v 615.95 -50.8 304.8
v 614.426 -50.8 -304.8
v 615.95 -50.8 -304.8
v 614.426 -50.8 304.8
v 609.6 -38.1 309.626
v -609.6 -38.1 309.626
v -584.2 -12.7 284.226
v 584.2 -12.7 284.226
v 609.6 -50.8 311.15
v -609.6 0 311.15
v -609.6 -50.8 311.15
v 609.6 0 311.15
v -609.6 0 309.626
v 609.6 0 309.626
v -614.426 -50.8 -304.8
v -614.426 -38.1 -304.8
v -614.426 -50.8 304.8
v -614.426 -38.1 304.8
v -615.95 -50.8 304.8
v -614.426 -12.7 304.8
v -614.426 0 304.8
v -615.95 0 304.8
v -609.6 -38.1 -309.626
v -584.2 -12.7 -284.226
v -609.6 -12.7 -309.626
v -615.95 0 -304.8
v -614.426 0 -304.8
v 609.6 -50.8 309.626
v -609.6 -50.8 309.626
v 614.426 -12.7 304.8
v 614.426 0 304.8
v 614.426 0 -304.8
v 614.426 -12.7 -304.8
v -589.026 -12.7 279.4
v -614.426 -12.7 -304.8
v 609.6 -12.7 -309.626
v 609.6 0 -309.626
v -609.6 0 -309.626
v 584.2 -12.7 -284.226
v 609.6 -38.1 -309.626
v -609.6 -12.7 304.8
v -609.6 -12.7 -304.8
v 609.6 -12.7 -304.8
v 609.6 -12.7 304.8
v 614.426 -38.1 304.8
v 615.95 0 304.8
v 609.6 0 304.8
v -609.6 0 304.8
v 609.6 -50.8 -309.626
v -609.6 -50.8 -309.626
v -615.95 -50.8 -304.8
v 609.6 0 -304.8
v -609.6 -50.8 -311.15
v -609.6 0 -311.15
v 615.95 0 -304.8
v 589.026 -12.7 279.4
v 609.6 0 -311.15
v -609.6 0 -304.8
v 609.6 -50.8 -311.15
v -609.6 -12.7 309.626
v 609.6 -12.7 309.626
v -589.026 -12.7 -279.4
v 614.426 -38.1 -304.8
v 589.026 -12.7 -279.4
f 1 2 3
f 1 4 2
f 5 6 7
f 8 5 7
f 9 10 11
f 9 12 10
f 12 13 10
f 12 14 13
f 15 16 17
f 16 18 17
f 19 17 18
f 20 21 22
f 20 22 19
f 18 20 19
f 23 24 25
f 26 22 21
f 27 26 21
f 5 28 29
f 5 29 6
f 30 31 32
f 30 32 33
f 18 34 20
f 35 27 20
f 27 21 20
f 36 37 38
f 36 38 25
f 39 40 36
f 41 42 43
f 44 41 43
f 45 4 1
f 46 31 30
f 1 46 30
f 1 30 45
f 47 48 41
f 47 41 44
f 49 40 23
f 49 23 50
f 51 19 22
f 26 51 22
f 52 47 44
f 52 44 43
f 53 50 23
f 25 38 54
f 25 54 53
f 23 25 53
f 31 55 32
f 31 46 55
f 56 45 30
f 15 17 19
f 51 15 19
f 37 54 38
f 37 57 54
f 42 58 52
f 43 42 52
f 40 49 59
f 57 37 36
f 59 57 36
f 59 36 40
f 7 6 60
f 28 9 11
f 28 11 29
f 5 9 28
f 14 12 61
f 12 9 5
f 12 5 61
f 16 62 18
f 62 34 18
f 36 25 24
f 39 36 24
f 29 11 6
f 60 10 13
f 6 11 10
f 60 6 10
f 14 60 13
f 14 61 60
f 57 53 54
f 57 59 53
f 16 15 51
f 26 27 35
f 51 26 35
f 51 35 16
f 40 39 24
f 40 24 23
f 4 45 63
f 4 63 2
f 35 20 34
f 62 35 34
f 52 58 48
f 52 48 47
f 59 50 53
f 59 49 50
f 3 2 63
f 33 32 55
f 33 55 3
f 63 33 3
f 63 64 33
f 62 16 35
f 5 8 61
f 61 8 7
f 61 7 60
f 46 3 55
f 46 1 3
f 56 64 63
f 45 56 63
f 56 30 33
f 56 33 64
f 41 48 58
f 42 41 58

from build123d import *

# Parameters (mm, degrees)
SKETCH1_W             = 1219.2
SKETCH1_H             = 609.6
BOSS_EXTRUDE1_DEPTH   = 12.7
BOSS_EXTRUDE2_DEPTH   = 609.6
BOSS_EXTRUDE2_2_DEPTH = 609.6
BOSS_EXTRUDE3_DEPTH   = 304.8
BOSS_EXTRUDE3_2_DEPTH = 304.8
CUT_EXTRUDE1_START    = -38.1
CUT_EXTRUDE1_DEPTH    = 25.4
CUT_EXTRUDE1_2_DEPTH  = 25.4
CUT_EXTRUDE1_3_DEPTH  = 25.4
CUT_EXTRUDE1_4_DEPTH  = 25.4


# Read off the part's stored shape, not the designer's step: Cut-Extrude1
with BuildPart() as part:
    # Sketch1 → Boss-Extrude1 (new body)
    with BuildSketch(Plane(origin=(0, 0, 0), x_dir=(1, 0, 0), z_dir=(0, 1, 0))):
        Rectangle(SKETCH1_W, SKETCH1_H)
    extrude(amount=-BOSS_EXTRUDE1_DEPTH)


with BuildPart() as body_2:
    # Sketch2 → Boss-Extrude2 (new, symmetric)
    with BuildSketch(Plane(origin=(0, 0, 0), x_dir=(0, 0, -1), z_dir=(1, 0, 0))):
        Polygon((-311.15, 0), (-311.15, -50.8), (-309.626, -50.8), (-309.626, -38.1), (-284.226, -12.7), (-309.626, -12.7), (-309.626, 0), align=None)
    extrude(amount=BOSS_EXTRUDE2_DEPTH, both=True)

    # Cut-Extrude1 4 outline → Cut-Extrude1 4 (cut)
    with BuildSketch(Plane(origin=(0, 0, 0), x_dir=(1, 0, 0), z_dir=(0, 1, 0)).offset(CUT_EXTRUDE1_START)):
        Polygon((-609.6, -283), (-609.6, -309.626), (-582.974, -283), align=None)
        Polygon((609.6, -283), (582.974, -283), (609.6, -309.626), align=None)
    extrude(amount=CUT_EXTRUDE1_4_DEPTH, mode=Mode.SUBTRACT)


with BuildPart() as body_3:
    # Sketch2 → Boss-Extrude2 2 (new, symmetric)
    with BuildSketch(Plane(origin=(0, 0, 0), x_dir=(0, 0, -1), z_dir=(1, 0, 0))):
        Polygon((311.15, 0), (309.626, 0), (309.626, -12.7), (284.226, -12.7), (309.626, -38.1), (309.626, -50.8), (311.15, -50.8), align=None)
    extrude(amount=BOSS_EXTRUDE2_2_DEPTH, both=True)

    # Cut-Extrude1 2 outline → Cut-Extrude1 2 (cut)
    with BuildSketch(Plane(origin=(0, 0, 0), x_dir=(1, 0, 0), z_dir=(0, 1, 0)).offset(CUT_EXTRUDE1_START)):
        Polygon((-582.974, 283), (-609.6, 309.626), (-609.6, 283), align=None)
        Polygon((609.6, 309.626), (582.974, 283), (609.6, 283), align=None)
    extrude(amount=CUT_EXTRUDE1_2_DEPTH, mode=Mode.SUBTRACT)


with BuildPart() as body_4:
    # Sketch3 → Boss-Extrude3 (new, symmetric)
    with BuildSketch(Plane.XY):
        Polygon((615.95, 0), (614.426, 0), (614.426, -12.7), (589.026, -12.7), (614.426, -38.1), (614.426, -50.8), (615.95, -50.8), align=None)
    extrude(amount=BOSS_EXTRUDE3_DEPTH, both=True)

    # Cut-Extrude1 3 outline → Cut-Extrude1 3 (cut)
    with BuildSketch(Plane(origin=(0, 0, 0), x_dir=(1, 0, 0), z_dir=(0, 1, 0)).offset(CUT_EXTRUDE1_START)):
        Polygon((588, 278.374), (614.426, 304.8), (588, 304.8), align=None)
        Polygon((614.426, -304.8), (588, -278.374), (588, -304.8), align=None)
    extrude(amount=CUT_EXTRUDE1_3_DEPTH, mode=Mode.SUBTRACT)


with BuildPart() as body_5:
    # Sketch3 → Boss-Extrude3 2 (new, symmetric)
    with BuildSketch(Plane.XY):
        Polygon((-615.95, 0), (-614.426, 0), (-614.426, -12.7), (-589.026, -12.7), (-614.426, -38.1), (-614.426, -50.8), (-615.95, -50.8), align=None)
    extrude(amount=BOSS_EXTRUDE3_2_DEPTH, both=True)

    # Cut-Extrude1 outline → Cut-Extrude1 (cut)
    with BuildSketch(Plane(origin=(0, 0, 0), x_dir=(1, 0, 0), z_dir=(0, 1, 0)).offset(CUT_EXTRUDE1_START)):
        Polygon((-588, 304.8), (-614.426, 304.8), (-588, 278.374), align=None)
        Polygon((-588, -304.8), (-588, -278.374), (-614.426, -304.8), align=None)
    extrude(amount=CUT_EXTRUDE1_DEPTH, mode=Mode.SUBTRACT)


solid = Compound([part.part, body_2.part, body_3.part, body_4.part, body_5.part])
